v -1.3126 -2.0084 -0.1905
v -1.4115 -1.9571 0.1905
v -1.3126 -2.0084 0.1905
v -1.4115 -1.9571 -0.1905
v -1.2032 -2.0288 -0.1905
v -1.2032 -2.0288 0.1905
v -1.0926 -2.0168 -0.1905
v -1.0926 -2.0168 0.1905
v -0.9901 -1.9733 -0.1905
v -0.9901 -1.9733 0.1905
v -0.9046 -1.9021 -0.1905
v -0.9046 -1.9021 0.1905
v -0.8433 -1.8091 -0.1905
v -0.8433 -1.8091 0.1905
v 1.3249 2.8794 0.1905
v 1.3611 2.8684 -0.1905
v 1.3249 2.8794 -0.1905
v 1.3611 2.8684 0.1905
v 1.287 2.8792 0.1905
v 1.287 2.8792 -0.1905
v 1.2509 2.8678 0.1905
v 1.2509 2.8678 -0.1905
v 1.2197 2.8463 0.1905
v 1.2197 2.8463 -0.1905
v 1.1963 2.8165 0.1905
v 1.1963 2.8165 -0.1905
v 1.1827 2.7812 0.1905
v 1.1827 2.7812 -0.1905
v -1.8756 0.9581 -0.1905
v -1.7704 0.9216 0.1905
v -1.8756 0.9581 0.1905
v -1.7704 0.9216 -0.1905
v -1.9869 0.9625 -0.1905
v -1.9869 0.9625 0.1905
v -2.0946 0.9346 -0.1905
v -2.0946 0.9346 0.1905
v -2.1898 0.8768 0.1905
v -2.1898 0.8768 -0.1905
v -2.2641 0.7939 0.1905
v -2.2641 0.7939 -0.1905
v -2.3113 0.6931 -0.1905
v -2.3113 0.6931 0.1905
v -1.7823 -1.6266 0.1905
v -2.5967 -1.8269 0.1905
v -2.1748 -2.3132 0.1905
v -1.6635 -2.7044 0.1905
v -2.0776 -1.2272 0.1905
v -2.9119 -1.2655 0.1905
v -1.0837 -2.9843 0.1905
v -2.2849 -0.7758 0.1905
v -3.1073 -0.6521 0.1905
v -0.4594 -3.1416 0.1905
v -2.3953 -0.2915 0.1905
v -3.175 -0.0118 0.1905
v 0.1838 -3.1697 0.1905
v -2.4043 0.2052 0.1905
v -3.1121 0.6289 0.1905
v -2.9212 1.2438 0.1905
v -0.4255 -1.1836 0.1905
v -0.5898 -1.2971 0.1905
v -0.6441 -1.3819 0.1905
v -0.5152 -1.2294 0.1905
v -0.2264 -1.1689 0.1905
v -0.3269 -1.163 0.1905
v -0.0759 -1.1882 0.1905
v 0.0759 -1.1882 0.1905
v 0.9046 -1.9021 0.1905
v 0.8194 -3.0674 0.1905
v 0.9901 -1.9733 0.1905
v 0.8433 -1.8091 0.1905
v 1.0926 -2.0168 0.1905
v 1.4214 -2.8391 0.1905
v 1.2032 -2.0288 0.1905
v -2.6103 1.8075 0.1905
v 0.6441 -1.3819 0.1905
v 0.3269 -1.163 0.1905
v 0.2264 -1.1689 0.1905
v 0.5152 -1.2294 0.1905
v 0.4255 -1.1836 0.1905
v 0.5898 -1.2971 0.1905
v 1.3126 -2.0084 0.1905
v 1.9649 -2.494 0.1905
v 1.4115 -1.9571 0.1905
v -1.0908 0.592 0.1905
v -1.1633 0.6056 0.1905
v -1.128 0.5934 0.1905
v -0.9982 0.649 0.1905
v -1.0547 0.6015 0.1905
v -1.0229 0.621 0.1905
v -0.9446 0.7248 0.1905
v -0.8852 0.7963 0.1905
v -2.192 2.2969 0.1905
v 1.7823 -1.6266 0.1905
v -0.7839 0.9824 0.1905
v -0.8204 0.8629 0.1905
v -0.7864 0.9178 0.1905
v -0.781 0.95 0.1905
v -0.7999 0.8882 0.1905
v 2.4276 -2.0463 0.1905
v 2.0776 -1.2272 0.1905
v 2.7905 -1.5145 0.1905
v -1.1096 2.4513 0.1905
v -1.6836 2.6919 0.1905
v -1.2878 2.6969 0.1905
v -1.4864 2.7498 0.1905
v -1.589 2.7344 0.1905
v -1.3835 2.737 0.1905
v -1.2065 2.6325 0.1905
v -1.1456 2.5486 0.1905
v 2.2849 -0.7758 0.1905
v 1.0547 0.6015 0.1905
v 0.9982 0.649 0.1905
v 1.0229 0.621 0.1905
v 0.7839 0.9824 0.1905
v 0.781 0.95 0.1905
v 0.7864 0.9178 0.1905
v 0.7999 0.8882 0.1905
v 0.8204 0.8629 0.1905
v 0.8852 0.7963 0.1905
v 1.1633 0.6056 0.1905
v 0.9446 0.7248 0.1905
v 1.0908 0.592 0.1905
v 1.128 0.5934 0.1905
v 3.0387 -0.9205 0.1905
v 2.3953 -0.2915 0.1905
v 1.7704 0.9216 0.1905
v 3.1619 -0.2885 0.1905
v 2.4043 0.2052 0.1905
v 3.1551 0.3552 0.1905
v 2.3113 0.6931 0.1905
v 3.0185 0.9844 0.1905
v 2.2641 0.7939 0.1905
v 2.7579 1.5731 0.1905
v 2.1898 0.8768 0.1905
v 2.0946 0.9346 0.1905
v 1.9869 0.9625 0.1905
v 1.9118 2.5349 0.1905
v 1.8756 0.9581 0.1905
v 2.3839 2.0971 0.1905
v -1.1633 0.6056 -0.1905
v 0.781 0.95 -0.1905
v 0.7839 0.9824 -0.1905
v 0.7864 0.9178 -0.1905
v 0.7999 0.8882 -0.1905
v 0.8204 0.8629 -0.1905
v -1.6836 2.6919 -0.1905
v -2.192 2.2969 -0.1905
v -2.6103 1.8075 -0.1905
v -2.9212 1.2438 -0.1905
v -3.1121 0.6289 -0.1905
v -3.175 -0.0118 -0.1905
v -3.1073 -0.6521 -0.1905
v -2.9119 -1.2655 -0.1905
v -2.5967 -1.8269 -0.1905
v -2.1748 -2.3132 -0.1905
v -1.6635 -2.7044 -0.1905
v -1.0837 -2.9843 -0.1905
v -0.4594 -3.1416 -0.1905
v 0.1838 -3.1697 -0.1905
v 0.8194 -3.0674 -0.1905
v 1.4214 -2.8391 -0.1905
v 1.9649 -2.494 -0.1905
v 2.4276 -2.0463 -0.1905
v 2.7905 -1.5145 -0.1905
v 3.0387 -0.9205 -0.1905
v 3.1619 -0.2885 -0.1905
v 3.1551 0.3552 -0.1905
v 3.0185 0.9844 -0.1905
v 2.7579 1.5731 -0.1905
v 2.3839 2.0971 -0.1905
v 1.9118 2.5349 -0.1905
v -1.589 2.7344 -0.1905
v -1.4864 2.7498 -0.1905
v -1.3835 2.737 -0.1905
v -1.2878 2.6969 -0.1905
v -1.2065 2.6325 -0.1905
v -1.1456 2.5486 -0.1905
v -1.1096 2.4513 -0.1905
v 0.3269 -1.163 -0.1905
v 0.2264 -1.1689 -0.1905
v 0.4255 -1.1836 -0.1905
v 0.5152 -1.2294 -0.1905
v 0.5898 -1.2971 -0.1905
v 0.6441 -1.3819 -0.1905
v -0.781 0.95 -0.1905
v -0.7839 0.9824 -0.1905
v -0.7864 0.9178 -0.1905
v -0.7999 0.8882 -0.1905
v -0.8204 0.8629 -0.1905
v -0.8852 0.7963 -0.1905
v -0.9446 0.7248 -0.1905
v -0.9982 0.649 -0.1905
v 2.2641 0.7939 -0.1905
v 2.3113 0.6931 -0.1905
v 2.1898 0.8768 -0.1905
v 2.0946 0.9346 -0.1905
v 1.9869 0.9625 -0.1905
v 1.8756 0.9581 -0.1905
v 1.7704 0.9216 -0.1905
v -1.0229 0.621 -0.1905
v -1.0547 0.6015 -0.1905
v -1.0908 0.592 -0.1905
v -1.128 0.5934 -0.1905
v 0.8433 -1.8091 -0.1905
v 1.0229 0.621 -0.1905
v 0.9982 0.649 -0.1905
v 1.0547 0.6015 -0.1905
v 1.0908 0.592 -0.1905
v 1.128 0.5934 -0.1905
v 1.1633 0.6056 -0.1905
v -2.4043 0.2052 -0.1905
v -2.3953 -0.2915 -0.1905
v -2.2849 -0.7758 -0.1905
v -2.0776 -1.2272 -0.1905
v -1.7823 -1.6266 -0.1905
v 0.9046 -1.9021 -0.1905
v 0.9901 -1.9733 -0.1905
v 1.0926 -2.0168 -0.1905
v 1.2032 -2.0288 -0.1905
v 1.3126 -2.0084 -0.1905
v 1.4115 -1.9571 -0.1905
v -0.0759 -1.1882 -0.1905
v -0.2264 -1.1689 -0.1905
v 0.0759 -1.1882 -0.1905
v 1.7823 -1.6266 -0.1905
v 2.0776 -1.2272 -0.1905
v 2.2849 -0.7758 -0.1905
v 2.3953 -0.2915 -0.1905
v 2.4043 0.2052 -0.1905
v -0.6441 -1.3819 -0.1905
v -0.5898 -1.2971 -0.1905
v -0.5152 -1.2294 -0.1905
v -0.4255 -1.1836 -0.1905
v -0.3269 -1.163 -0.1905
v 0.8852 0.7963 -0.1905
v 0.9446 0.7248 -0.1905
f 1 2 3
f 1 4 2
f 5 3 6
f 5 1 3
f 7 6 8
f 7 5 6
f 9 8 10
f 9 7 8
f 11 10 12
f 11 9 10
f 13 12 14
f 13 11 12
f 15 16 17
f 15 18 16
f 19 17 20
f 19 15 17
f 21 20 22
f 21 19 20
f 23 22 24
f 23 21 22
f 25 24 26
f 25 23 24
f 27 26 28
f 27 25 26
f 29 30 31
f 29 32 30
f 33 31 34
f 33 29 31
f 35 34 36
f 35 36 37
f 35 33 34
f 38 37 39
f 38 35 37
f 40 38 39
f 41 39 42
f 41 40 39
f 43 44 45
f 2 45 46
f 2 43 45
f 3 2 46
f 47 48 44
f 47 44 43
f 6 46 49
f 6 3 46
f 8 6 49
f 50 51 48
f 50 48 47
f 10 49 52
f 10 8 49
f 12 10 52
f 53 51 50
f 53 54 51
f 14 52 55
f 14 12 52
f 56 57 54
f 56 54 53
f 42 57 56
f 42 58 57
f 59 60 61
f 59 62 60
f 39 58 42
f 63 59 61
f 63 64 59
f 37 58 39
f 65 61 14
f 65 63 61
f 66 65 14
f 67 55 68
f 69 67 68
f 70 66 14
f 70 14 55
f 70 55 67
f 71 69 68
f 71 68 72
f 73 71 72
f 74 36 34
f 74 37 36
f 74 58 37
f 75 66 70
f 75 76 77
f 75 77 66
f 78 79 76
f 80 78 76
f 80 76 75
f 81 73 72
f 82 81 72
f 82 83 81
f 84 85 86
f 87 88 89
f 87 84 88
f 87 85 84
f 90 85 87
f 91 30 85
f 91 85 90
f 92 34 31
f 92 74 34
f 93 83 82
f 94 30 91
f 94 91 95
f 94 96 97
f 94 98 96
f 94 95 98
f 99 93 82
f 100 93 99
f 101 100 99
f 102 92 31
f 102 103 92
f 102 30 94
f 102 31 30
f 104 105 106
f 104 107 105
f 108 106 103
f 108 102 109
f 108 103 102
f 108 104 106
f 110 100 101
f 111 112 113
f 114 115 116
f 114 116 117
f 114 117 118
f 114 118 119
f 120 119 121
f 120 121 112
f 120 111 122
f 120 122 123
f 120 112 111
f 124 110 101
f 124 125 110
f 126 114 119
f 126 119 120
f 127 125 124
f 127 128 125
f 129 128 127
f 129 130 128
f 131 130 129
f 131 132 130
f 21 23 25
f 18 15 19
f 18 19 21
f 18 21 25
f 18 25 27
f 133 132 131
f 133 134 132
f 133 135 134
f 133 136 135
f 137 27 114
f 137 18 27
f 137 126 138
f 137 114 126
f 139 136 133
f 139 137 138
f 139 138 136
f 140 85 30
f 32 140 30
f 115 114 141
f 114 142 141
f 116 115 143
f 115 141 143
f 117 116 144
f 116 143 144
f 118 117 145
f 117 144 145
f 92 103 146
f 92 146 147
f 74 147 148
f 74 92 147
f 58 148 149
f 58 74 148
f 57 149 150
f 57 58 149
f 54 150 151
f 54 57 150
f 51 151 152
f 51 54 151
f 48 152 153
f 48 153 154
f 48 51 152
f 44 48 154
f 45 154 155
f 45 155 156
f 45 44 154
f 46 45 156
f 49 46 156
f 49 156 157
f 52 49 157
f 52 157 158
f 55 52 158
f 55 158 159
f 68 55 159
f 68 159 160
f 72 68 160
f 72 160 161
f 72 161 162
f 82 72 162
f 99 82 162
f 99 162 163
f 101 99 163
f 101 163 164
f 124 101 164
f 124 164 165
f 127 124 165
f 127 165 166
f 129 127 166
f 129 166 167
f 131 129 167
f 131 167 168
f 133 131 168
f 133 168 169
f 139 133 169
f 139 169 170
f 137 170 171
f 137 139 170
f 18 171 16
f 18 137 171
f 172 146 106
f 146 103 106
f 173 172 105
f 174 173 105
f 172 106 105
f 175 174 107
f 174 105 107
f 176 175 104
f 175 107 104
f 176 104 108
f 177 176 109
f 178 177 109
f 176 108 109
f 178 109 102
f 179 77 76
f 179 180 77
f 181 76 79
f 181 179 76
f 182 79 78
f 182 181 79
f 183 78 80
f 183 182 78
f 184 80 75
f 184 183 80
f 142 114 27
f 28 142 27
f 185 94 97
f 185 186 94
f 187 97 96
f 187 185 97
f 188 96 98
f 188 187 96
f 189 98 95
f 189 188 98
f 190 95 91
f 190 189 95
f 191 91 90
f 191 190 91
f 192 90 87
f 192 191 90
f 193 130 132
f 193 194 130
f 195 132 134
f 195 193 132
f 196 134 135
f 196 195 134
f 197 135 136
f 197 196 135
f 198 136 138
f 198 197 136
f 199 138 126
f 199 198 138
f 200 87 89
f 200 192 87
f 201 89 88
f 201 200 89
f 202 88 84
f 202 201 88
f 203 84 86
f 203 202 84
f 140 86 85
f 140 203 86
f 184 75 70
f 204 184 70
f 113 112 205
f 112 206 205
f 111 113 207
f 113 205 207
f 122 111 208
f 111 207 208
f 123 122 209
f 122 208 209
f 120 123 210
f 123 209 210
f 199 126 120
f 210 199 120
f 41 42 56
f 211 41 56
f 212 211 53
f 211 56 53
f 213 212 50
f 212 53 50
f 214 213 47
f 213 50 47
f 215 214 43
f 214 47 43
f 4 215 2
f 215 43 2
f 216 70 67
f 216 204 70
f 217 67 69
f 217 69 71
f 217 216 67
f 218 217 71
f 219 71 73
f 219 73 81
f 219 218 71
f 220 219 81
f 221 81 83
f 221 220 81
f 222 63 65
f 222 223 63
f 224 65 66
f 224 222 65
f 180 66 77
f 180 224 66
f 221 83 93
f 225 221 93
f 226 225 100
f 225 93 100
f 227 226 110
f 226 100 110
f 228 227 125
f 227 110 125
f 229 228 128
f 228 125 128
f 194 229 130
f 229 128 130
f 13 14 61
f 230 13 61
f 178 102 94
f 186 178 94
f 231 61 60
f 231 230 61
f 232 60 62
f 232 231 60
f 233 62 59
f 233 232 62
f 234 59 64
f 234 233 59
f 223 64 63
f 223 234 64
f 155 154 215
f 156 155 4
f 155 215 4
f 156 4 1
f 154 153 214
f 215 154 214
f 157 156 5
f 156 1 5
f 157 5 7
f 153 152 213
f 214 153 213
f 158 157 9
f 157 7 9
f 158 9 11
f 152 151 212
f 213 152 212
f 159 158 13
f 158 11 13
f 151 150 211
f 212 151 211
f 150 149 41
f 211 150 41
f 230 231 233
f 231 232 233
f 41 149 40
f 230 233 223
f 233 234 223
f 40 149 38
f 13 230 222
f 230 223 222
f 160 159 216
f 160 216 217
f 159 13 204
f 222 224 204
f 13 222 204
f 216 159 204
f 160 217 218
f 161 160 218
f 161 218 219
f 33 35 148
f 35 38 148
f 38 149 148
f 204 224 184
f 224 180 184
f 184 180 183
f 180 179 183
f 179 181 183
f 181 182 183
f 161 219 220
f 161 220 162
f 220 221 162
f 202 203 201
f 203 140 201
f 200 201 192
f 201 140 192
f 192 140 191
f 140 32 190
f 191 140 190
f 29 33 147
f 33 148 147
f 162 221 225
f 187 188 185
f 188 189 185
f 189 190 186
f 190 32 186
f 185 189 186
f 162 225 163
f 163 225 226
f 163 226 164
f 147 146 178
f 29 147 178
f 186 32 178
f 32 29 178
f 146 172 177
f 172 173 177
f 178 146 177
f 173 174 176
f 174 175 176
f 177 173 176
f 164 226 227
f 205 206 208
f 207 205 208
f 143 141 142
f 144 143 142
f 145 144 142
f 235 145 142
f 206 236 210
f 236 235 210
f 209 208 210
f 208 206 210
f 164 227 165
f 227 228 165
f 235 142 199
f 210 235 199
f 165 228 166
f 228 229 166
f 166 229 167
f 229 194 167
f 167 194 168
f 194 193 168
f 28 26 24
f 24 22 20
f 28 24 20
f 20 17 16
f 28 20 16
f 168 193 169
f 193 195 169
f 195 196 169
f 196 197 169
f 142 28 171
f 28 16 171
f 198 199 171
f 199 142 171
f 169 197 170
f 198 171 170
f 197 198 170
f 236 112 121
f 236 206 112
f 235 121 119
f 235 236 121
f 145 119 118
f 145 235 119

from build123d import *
from OCP.BRepFilletAPI import BRepFilletAPI_MakeFillet

# Parameters (mm, degrees)
SKETCH1_R           = 3.175
SKETCH1_R_2         = 1.190625
BOSS_EXTRUDE1_DEPTH = 0.1905
CUT_EXTRUDE1_DEPTH  = 5.50626353
CUT_EXTRUDE2_DEPTH  = 5.50626353
FILLET1_R1          = 0.381
FILLET1_R2          = 0.127


with BuildPart() as part:
    # Sketch1 → Boss-Extrude1 (new, symmetric)
    with BuildSketch(Plane.XY):
        Circle(SKETCH1_R)
        Circle(SKETCH1_R_2, mode=Mode.SUBTRACT)
    extrude(amount=BOSS_EXTRUDE1_DEPTH, both=True)

    # Sketch2 → Cut-Extrude1 (cut, through all)
    with BuildSketch(Plane.XY.offset(0.1905)):
        with BuildLine():
            Line((-1.216302436, 2.932785942), (-0.767848913, 0.909942821))
            ThreePointArc((-0.767848913, 0.909942821), (0, 1.190625), (0.767848913, 0.909942821))
            Line((0.767848913, 0.909942821), (1.216302436, 2.932785942))
            ThreePointArc((1.216302436, 2.932785942), (0, 3.175), (-1.216302436, 2.932785942))
        make_face()
    extrude(amount=-CUT_EXTRUDE1_DEPTH, mode=Mode.SUBTRACT)

    # Sketch3 → Cut-Extrude2 (cut, through all)
    with BuildSketch(Plane.XY.offset(0.1905)):
        with BuildLine():
            Line((-1.056097273, 0.549769443), (-2.14035714, 1.114199404))
            ThreePointArc((-2.14035714, 1.114199404), (-2.284896317, -0.775769179), (-1.019518005, -2.187041846))
            Line((-1.019518005, -2.187041846), (-0.50292, -1.079193849))
            ThreePointArc((-0.50292, -1.079193849), (-1.127392596, -0.382849611), (-1.056097273, 0.549769443))
        make_face()
        with BuildLine():
            Line((0.50292, -1.079193849), (1.019518005, -2.187041846))
            ThreePointArc((1.019518005, -2.187041846), (2.284896317, -0.775769179), (2.14035714, 1.114199404))
            Line((2.14035714, 1.114199404), (1.056097273, 0.549769443))
            ThreePointArc((1.056097273, 0.549769443), (1.127392596, -0.382849611), (0.50292, -1.079193849))
        make_face()
    extrude(amount=-CUT_EXTRUDE2_DEPTH, mode=Mode.SUBTRACT)

    # Fillet1: one fillet with a radius per group of edges: ONE call of the kernel's fillet builder (fillet() takes one radius for all edges)
    fillet1_edges_1 = [part.edges().sort_by_distance(p)[0] for p in [
        (-1.216302436, 2.932785942, 0),
        (-2.14035714, 1.114199404, 0),
        (-1.019518005, -2.187041846, 0),
        (-0.50292, -1.079193849, 0),
        (0.50292, -1.079193849, 0),
        (1.019518005, -2.187041846, 0),
        (2.14035714, 1.114199404, 0),
    ]]
    fillet1_edges_2 = [part.edges().sort_by_distance(p)[0] for p in [
        (1.216302436, 2.932785942, 0),
        (-0.767848913, 0.909942821, 0),
        (-1.056097273, 0.549769443, 0),
        (1.056097273, 0.549769443, 0),
        (0.767848913, 0.909942821, 0),
    ]]
    fillet1 = BRepFilletAPI_MakeFillet(part.part.solid().wrapped)
    for e in fillet1_edges_1:
        fillet1.Add(FILLET1_R1, e.wrapped)
    for e in fillet1_edges_2:
        fillet1.Add(FILLET1_R2, e.wrapped)
    add(Compound.cast(fillet1.Shape()), mode=Mode.REPLACE)


solid = part.part
